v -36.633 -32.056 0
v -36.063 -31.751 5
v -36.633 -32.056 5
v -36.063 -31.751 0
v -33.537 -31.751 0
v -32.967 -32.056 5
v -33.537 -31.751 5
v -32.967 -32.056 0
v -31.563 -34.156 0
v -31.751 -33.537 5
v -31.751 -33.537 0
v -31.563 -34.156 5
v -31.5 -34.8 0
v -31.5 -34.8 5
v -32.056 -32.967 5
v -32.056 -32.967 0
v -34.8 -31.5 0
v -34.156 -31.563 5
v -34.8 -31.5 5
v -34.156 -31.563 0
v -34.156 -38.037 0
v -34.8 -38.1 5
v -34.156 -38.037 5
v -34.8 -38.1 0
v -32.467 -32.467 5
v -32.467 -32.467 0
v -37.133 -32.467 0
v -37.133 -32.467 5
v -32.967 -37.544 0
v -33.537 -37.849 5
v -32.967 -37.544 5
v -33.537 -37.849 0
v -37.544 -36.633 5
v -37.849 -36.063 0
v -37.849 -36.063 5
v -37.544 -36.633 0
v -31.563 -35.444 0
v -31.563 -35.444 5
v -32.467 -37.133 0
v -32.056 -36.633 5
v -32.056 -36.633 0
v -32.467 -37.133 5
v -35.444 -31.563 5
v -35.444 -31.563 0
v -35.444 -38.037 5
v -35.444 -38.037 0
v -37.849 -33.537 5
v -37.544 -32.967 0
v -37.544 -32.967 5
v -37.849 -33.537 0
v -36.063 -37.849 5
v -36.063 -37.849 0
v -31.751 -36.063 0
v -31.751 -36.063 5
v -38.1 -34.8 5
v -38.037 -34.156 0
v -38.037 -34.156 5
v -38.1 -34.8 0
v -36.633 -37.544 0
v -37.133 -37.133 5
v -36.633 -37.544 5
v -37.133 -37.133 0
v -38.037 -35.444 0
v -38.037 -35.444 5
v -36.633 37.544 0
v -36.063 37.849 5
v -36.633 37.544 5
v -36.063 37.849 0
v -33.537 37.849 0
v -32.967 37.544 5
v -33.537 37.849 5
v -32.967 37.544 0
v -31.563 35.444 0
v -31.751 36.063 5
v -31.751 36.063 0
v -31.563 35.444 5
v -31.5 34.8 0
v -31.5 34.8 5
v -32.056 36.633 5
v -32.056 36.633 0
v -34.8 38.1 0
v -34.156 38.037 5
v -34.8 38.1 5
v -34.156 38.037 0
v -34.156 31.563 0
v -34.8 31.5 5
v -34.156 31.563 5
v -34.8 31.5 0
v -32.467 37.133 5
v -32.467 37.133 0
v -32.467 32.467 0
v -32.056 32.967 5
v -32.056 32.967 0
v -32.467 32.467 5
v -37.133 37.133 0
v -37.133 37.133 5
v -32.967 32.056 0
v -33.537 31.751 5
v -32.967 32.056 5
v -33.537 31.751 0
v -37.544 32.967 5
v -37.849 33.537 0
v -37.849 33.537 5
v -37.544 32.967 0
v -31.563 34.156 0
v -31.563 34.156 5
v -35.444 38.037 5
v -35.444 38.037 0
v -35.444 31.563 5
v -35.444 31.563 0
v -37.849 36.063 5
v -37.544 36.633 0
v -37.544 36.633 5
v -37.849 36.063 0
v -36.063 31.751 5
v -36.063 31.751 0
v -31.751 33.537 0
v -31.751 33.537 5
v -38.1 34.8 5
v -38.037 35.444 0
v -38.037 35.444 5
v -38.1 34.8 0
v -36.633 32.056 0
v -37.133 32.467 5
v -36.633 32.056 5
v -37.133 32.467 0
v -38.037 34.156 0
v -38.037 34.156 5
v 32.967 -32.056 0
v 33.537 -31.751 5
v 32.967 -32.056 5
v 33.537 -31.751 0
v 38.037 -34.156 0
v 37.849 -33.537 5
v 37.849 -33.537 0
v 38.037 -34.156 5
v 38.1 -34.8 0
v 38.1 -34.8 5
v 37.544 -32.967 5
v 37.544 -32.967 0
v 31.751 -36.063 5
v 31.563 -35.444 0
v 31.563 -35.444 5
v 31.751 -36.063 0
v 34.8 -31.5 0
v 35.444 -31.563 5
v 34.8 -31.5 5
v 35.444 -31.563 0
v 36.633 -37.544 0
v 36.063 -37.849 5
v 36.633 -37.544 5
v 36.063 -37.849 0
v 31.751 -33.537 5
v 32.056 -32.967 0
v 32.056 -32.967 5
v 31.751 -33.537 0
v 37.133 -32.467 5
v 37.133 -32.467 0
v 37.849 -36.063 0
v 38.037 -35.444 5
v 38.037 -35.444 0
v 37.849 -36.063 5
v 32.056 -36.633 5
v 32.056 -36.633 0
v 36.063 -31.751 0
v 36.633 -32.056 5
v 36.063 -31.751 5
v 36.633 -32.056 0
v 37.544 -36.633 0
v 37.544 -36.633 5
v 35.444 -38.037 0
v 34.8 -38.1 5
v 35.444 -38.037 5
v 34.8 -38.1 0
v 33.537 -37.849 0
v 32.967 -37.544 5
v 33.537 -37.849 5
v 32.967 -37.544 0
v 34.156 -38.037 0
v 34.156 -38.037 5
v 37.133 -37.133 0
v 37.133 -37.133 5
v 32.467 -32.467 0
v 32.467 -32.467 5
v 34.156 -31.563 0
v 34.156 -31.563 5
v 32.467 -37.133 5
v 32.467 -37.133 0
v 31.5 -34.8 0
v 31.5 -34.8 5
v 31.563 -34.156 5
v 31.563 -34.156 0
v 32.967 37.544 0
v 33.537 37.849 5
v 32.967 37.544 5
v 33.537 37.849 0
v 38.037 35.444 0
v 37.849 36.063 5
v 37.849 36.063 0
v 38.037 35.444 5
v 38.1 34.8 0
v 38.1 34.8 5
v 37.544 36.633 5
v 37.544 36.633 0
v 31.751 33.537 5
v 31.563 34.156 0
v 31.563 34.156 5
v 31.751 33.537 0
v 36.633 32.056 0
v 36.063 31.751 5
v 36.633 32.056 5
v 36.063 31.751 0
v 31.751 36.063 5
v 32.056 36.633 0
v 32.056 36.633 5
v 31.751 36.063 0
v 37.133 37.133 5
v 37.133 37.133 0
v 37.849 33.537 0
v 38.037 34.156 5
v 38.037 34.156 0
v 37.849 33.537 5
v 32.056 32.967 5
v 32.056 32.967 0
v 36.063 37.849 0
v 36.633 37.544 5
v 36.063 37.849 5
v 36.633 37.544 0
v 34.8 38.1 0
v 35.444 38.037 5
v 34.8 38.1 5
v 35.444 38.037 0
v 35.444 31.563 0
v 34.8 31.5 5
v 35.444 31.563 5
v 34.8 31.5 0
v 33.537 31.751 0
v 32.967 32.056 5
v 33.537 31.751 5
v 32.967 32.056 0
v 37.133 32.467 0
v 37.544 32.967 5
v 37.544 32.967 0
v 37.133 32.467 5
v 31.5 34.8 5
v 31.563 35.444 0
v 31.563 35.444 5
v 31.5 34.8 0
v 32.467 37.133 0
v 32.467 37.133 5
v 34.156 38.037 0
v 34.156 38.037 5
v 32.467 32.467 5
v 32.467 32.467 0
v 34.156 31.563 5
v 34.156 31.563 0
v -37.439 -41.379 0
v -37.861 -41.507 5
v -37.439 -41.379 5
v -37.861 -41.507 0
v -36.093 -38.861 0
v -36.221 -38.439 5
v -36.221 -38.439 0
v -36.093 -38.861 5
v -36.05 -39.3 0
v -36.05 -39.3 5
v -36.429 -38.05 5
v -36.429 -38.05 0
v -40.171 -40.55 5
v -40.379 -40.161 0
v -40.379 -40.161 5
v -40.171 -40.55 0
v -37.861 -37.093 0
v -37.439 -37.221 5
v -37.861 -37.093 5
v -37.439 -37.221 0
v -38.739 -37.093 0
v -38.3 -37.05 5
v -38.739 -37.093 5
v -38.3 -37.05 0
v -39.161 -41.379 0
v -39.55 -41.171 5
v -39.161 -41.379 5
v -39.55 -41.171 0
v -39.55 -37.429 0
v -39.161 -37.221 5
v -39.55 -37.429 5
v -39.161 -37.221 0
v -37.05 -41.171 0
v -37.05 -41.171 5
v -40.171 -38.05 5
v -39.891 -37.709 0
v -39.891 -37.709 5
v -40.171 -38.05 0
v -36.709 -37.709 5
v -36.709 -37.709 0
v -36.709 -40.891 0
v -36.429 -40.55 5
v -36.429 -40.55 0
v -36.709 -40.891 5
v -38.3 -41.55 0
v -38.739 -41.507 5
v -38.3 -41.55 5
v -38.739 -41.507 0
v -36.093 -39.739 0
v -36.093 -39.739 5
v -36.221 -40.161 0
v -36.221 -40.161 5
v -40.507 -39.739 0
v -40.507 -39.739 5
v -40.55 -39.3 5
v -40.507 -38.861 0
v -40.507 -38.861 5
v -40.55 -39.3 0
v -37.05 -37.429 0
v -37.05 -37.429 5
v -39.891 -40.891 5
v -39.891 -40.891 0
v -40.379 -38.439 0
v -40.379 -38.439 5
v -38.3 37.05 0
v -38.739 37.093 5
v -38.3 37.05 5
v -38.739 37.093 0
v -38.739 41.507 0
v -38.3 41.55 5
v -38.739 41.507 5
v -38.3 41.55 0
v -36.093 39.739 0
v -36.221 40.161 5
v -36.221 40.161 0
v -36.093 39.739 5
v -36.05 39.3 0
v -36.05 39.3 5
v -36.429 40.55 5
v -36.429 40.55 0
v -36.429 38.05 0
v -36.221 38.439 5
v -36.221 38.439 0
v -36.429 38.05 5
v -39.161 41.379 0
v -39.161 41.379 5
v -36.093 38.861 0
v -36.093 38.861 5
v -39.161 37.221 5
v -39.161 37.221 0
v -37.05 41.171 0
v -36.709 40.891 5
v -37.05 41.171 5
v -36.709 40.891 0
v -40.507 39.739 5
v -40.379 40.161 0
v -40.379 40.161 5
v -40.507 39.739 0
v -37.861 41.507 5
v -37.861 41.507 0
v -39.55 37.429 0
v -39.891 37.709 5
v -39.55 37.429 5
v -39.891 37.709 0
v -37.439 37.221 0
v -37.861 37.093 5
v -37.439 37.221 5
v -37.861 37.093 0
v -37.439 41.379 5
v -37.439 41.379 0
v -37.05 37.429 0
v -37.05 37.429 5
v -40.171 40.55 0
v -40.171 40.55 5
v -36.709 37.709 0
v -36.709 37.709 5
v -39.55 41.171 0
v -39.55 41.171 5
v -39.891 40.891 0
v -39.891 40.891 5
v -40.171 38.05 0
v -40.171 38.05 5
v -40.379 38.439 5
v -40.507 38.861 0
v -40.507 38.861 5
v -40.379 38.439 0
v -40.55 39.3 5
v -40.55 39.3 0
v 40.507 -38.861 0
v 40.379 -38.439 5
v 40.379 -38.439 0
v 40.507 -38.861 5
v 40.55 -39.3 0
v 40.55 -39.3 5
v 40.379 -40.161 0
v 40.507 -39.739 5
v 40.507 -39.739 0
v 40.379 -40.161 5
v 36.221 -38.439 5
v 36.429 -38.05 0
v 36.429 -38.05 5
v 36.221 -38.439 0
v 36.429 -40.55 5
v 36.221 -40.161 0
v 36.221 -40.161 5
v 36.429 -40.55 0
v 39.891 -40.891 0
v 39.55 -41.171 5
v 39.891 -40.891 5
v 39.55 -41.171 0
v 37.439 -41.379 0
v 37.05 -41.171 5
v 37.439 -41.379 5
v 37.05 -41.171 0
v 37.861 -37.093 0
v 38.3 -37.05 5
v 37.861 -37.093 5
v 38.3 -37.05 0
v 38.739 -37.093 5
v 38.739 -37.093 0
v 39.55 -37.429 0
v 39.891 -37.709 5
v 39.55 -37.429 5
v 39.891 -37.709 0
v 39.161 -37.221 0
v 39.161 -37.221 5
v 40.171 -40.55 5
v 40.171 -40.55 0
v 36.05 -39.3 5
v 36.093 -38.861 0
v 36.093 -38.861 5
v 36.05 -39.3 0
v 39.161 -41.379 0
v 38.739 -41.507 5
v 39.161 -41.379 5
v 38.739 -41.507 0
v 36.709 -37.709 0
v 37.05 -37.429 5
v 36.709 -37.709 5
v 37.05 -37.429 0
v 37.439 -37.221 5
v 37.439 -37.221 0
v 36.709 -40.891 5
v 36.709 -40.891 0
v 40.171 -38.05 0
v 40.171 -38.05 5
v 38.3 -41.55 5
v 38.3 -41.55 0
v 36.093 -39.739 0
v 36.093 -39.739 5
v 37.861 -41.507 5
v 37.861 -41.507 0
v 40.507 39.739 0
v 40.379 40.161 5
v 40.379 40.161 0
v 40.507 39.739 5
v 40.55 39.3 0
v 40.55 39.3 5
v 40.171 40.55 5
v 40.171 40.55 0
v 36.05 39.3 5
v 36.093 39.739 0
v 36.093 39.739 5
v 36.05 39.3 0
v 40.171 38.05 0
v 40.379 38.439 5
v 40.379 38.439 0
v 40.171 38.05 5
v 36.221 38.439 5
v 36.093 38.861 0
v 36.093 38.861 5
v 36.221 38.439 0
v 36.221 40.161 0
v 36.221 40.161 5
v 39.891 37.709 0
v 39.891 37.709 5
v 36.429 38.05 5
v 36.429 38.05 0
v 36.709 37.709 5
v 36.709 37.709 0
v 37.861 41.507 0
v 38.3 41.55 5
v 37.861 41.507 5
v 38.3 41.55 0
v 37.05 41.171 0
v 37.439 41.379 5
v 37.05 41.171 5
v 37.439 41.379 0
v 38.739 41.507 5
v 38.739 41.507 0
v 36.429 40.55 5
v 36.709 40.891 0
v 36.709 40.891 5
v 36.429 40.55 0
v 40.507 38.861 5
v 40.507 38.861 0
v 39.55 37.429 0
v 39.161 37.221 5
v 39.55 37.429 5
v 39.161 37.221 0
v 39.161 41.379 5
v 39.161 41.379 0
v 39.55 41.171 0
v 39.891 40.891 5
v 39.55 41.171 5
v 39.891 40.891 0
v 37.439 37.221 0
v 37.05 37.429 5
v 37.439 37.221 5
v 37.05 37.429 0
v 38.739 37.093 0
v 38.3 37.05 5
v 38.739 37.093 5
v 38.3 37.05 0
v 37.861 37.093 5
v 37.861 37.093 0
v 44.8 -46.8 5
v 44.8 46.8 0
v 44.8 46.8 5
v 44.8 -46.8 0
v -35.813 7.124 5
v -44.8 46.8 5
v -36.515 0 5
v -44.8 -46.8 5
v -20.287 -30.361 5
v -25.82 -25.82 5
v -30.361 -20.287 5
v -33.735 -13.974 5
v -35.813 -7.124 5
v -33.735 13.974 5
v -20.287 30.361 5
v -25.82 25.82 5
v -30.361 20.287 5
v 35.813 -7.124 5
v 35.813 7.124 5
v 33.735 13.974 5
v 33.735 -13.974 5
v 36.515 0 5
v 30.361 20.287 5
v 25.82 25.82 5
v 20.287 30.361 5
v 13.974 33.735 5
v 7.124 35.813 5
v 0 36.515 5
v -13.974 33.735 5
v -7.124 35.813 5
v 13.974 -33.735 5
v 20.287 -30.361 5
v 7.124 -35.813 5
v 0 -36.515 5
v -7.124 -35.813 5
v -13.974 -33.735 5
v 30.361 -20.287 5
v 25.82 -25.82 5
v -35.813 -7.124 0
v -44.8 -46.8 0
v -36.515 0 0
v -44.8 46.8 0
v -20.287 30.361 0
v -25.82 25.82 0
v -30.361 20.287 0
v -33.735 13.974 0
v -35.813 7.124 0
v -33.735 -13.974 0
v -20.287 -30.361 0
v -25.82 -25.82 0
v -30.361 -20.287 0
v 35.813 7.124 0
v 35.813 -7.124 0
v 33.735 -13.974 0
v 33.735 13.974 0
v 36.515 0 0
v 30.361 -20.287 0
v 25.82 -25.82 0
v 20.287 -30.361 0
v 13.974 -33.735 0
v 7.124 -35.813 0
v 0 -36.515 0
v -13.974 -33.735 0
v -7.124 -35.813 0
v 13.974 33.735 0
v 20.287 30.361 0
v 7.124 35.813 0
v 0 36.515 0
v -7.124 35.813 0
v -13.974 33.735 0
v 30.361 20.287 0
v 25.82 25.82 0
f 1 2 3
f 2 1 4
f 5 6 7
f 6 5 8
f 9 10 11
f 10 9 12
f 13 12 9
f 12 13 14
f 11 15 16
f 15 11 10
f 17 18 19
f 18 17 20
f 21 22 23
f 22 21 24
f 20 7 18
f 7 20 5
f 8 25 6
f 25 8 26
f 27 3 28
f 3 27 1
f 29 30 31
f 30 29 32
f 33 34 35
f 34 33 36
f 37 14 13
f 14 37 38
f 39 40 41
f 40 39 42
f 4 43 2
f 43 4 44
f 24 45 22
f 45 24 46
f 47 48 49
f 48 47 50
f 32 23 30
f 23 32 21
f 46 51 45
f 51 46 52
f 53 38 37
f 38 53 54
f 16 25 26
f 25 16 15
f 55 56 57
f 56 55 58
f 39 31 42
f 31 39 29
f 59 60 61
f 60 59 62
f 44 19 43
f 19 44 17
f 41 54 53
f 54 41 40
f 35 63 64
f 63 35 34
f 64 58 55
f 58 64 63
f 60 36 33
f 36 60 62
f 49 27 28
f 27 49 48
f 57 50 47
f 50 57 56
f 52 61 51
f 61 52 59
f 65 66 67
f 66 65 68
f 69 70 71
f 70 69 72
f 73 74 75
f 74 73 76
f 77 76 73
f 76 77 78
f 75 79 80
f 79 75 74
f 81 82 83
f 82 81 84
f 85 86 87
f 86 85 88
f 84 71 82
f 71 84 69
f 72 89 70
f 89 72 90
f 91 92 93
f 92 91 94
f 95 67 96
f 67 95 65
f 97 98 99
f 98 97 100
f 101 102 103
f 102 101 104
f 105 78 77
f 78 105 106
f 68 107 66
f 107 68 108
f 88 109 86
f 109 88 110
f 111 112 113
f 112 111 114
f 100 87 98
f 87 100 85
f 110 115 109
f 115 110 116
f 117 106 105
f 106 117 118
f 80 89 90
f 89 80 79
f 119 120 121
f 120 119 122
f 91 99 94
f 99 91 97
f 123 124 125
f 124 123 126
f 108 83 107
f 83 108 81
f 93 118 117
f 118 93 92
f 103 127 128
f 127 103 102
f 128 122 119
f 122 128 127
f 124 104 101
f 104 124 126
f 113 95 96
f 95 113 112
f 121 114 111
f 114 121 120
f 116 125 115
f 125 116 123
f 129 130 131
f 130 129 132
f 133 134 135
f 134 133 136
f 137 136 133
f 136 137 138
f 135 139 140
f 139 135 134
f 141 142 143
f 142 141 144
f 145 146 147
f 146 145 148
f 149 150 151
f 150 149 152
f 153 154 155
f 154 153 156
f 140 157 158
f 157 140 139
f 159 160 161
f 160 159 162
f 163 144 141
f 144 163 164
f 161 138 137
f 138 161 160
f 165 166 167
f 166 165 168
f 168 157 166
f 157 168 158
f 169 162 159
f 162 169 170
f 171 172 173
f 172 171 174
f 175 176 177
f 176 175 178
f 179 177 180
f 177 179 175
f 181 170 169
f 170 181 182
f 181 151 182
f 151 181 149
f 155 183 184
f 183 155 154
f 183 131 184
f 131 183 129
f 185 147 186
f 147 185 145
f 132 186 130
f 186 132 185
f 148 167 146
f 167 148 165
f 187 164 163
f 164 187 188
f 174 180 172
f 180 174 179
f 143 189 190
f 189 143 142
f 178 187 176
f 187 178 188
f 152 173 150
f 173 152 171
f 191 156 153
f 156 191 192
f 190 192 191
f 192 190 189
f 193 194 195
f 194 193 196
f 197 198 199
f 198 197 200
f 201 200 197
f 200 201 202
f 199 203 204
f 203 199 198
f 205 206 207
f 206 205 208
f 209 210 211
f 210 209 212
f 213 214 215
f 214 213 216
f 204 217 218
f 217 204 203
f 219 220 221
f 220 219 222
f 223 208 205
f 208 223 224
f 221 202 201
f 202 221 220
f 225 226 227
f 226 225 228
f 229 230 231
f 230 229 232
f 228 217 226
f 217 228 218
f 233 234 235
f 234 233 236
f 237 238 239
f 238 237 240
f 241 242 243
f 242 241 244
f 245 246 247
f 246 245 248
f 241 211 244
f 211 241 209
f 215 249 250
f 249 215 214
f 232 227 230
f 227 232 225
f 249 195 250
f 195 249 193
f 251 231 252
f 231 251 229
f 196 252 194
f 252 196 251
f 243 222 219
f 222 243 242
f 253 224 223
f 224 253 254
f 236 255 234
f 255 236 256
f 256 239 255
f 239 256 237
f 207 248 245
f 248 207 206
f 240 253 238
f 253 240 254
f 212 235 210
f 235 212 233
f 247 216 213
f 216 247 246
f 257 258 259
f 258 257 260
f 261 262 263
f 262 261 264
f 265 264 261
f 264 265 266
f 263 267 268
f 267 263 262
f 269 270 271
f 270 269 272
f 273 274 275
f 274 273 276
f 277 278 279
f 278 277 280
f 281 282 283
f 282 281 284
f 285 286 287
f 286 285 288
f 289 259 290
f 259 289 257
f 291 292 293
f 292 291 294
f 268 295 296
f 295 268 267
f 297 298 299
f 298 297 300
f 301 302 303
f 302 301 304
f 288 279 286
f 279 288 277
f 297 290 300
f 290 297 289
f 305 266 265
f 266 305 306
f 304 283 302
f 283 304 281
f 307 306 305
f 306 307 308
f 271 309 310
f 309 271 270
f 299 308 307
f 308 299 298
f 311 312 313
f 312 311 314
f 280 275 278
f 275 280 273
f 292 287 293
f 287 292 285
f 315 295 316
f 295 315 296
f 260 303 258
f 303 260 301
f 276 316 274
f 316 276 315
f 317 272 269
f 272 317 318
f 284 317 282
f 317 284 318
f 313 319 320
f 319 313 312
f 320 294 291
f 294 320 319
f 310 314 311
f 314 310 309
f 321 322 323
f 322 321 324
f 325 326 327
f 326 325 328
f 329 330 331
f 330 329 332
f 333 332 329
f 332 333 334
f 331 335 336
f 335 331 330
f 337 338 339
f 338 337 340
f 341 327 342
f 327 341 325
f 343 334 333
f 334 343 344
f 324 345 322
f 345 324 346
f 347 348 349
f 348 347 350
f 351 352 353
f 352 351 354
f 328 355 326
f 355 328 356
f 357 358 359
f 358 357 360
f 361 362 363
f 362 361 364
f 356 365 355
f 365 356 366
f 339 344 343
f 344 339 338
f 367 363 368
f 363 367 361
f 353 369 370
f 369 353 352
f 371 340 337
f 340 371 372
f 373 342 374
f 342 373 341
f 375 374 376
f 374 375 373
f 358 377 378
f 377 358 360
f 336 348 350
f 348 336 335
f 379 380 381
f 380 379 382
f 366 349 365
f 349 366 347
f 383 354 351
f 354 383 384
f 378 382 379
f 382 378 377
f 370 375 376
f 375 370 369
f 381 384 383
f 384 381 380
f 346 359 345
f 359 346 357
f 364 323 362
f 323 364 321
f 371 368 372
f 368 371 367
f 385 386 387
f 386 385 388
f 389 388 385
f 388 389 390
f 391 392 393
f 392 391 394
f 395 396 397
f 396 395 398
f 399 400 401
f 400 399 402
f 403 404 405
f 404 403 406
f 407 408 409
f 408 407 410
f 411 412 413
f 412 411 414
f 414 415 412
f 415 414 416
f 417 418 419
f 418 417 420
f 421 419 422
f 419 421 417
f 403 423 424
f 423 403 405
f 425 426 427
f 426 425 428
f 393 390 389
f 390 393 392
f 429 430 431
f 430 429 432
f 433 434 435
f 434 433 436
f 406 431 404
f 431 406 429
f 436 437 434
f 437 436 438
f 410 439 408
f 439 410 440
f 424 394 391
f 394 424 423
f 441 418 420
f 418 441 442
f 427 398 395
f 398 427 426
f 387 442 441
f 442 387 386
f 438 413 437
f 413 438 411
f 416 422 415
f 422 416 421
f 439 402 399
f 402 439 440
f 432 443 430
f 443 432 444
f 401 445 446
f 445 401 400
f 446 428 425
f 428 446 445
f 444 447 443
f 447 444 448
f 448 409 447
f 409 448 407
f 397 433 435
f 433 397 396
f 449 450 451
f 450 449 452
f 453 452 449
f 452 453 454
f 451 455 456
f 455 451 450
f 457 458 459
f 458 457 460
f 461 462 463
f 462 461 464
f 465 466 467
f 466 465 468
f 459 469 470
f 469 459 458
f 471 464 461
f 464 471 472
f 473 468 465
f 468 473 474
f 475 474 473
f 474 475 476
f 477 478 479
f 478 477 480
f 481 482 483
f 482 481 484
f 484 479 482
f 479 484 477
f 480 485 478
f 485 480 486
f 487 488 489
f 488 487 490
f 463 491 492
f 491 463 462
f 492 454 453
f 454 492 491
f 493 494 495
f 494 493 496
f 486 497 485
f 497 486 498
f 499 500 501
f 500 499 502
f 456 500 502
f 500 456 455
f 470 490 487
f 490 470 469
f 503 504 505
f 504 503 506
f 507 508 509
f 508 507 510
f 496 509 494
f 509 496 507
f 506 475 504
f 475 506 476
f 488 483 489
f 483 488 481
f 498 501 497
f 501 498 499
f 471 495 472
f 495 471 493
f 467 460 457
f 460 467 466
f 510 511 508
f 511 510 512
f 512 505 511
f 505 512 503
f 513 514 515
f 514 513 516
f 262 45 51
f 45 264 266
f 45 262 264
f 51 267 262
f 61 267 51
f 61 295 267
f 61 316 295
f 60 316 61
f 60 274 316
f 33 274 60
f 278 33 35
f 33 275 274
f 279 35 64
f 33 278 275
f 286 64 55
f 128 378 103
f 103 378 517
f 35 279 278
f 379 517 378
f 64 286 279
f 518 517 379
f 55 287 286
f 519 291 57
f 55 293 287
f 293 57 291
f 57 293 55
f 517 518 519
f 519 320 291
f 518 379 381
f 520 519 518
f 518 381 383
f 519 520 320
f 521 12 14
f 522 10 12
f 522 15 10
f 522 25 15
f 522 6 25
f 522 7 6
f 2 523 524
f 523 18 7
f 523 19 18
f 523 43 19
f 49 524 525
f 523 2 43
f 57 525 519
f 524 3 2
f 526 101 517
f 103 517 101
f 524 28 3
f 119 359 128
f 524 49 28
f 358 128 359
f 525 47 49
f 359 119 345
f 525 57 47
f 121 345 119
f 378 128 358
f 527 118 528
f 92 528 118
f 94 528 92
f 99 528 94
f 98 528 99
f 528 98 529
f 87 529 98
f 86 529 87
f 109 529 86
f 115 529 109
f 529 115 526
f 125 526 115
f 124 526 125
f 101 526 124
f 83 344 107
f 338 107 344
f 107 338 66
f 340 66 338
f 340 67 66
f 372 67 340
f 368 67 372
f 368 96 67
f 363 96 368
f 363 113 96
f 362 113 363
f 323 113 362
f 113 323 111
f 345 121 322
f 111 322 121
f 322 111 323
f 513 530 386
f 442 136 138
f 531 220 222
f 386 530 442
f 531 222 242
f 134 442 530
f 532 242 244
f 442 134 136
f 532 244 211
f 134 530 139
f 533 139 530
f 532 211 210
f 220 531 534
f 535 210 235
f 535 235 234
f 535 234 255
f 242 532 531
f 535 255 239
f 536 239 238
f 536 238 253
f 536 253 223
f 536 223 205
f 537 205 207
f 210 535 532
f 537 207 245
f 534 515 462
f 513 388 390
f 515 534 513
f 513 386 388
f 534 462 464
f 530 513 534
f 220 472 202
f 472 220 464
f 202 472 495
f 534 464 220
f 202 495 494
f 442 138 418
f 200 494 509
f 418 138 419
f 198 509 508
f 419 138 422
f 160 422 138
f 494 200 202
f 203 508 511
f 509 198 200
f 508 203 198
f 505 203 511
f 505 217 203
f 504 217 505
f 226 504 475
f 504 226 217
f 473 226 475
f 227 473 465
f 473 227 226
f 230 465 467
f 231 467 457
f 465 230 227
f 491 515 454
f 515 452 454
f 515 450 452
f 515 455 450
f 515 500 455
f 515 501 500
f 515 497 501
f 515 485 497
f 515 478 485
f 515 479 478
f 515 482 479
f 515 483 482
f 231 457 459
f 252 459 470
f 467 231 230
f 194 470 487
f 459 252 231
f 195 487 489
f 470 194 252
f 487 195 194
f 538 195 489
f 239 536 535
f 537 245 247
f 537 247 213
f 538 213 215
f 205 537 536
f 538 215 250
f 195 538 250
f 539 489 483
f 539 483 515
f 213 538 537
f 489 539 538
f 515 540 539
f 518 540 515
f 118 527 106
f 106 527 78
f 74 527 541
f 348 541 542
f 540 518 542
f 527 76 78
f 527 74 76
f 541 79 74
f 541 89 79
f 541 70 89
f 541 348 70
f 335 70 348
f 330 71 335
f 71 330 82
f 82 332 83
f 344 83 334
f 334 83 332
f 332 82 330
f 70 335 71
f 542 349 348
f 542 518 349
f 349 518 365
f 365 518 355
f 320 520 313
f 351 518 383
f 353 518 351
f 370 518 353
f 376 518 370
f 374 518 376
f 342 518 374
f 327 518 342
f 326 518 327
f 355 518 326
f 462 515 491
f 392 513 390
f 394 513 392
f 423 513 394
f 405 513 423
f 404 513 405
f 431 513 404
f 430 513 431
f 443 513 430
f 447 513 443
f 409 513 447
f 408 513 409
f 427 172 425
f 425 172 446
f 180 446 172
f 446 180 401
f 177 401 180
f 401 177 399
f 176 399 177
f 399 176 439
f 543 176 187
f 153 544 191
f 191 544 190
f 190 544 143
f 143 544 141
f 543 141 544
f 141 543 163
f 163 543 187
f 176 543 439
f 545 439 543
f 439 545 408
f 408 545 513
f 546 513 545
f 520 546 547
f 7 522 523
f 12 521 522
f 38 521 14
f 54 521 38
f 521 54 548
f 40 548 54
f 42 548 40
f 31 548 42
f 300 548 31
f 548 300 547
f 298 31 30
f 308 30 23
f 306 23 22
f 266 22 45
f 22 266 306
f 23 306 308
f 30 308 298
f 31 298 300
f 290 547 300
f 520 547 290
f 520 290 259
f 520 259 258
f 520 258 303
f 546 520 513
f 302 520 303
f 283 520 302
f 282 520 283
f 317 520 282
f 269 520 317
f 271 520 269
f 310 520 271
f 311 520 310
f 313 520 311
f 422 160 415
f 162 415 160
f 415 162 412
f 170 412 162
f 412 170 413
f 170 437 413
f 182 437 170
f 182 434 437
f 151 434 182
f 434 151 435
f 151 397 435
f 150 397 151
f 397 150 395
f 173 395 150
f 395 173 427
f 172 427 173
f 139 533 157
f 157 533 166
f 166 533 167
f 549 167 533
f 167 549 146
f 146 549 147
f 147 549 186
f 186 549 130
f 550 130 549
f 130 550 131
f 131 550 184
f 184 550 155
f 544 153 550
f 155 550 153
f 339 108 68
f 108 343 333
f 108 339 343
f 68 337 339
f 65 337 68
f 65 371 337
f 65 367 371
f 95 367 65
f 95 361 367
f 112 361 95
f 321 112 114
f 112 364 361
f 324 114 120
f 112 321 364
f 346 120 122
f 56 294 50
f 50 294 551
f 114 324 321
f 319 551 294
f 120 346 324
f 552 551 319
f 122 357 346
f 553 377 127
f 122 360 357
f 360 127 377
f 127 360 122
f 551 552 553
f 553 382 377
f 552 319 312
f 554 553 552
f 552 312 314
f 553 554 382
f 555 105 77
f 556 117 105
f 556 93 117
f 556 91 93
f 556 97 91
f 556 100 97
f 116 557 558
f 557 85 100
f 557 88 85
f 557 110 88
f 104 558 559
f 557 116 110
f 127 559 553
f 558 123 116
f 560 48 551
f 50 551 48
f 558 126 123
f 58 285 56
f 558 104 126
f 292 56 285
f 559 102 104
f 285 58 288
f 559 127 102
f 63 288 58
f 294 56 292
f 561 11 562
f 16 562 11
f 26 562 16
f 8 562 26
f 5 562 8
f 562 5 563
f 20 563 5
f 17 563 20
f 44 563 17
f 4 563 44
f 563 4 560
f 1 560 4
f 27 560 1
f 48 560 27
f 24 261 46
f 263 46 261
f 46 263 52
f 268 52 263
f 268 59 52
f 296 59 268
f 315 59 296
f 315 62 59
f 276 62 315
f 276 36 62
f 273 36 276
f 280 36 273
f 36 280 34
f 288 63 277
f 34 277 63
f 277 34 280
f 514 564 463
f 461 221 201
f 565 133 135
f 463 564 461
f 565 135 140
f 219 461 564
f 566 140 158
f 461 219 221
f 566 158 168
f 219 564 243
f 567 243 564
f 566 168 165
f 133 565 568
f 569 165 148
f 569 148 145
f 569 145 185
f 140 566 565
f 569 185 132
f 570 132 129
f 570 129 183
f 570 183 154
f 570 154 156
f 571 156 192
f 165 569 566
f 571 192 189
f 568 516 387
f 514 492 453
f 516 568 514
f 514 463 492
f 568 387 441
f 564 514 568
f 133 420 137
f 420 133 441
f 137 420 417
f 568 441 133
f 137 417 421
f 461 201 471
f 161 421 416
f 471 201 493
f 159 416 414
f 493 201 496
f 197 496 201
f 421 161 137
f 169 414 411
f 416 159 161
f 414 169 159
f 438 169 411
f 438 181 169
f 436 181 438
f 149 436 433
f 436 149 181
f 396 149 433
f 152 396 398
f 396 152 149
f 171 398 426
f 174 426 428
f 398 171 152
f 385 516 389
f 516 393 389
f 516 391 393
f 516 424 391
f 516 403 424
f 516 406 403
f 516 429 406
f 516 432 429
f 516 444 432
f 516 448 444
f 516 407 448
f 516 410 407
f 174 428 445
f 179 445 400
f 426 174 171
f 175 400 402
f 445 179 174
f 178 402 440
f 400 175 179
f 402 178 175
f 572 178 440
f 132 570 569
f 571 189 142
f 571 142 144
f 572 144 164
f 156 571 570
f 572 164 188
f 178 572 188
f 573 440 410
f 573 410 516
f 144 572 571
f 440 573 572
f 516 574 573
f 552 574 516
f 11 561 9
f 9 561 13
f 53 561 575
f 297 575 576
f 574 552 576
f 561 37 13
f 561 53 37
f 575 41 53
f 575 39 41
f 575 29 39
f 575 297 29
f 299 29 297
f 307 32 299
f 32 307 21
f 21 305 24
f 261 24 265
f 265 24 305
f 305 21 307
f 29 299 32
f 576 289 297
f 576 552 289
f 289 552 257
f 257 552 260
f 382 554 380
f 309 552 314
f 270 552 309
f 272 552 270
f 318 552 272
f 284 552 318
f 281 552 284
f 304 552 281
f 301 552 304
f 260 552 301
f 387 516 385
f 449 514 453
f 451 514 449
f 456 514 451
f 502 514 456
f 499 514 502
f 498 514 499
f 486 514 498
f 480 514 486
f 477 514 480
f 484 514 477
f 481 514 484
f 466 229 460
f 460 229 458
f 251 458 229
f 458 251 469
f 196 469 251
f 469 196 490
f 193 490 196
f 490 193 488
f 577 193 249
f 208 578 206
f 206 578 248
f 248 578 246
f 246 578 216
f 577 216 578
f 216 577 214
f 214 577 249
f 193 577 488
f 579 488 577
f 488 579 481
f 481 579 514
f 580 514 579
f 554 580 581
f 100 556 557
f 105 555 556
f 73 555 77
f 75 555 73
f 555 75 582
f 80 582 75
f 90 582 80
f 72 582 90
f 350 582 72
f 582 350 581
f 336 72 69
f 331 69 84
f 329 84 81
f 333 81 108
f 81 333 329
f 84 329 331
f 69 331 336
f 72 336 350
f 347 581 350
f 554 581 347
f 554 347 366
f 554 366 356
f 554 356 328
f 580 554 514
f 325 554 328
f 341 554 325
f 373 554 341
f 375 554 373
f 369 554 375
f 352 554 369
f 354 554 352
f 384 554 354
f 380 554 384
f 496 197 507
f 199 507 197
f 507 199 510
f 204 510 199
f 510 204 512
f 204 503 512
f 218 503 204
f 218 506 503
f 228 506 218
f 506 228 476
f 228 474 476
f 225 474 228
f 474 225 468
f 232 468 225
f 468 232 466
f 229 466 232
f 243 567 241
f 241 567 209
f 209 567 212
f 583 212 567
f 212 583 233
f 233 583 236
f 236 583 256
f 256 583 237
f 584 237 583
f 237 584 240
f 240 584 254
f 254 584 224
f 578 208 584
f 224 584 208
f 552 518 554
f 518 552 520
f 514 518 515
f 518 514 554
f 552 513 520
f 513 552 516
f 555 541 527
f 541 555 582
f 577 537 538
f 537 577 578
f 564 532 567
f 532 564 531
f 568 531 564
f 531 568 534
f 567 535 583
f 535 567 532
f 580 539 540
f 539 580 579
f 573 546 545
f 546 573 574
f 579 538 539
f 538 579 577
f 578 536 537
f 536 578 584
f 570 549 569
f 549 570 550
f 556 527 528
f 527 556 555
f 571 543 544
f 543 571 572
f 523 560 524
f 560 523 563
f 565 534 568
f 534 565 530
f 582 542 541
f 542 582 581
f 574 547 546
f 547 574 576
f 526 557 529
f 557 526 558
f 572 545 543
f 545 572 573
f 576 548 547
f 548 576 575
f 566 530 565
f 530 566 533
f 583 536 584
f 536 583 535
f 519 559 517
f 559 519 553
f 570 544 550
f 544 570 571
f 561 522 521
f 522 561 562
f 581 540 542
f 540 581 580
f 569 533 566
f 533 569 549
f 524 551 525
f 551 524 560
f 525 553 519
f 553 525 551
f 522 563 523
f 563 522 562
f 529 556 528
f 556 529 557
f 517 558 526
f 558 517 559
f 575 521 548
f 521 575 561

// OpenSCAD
$fn = 32;

// ----------------------------------------------------------------------
// Motor mount plate: NEMA34, 89.6 x 93.6 x 5 mm
// ----------------------------------------------------------------------

// --- parameters (mm) ---
mount_w = 89.6;           // plate length, X
mount_d = 93.6;           // plate width, Y
mat_t = 5;                // plate thickness
motor_pitch = 69.6;       // NEMA34 bolt spacing
motor_d = 6.6;            // NEMA34 screw clearance
center_bore = 73.03;      // pilot boss bore
second_d = 4.5;           // second fastener hole

module plate() {
  translate([-mount_w / 2, -mount_d / 2, 0]) cube([mount_w, mount_d, mat_t]);
}

module motor_holes() {
  for (sx = [-1, 1]) for (sy = [-1, 1])
    translate([sx * motor_pitch / 2, sy * motor_pitch / 2, -1])
      cylinder(h = mat_t + 2, d = motor_d);
}

difference() {
  union() {
    plate();
  }
  motor_holes();
  translate([0, 0, -1]) cylinder(h = mat_t + 2, d = center_bore);
  for (sx = [-1, 1]) for (sy = [-1, 1])
    translate([sx * 38.3, sy * 39.3, -1]) cylinder(h = mat_t + 2, d = second_d);
}
